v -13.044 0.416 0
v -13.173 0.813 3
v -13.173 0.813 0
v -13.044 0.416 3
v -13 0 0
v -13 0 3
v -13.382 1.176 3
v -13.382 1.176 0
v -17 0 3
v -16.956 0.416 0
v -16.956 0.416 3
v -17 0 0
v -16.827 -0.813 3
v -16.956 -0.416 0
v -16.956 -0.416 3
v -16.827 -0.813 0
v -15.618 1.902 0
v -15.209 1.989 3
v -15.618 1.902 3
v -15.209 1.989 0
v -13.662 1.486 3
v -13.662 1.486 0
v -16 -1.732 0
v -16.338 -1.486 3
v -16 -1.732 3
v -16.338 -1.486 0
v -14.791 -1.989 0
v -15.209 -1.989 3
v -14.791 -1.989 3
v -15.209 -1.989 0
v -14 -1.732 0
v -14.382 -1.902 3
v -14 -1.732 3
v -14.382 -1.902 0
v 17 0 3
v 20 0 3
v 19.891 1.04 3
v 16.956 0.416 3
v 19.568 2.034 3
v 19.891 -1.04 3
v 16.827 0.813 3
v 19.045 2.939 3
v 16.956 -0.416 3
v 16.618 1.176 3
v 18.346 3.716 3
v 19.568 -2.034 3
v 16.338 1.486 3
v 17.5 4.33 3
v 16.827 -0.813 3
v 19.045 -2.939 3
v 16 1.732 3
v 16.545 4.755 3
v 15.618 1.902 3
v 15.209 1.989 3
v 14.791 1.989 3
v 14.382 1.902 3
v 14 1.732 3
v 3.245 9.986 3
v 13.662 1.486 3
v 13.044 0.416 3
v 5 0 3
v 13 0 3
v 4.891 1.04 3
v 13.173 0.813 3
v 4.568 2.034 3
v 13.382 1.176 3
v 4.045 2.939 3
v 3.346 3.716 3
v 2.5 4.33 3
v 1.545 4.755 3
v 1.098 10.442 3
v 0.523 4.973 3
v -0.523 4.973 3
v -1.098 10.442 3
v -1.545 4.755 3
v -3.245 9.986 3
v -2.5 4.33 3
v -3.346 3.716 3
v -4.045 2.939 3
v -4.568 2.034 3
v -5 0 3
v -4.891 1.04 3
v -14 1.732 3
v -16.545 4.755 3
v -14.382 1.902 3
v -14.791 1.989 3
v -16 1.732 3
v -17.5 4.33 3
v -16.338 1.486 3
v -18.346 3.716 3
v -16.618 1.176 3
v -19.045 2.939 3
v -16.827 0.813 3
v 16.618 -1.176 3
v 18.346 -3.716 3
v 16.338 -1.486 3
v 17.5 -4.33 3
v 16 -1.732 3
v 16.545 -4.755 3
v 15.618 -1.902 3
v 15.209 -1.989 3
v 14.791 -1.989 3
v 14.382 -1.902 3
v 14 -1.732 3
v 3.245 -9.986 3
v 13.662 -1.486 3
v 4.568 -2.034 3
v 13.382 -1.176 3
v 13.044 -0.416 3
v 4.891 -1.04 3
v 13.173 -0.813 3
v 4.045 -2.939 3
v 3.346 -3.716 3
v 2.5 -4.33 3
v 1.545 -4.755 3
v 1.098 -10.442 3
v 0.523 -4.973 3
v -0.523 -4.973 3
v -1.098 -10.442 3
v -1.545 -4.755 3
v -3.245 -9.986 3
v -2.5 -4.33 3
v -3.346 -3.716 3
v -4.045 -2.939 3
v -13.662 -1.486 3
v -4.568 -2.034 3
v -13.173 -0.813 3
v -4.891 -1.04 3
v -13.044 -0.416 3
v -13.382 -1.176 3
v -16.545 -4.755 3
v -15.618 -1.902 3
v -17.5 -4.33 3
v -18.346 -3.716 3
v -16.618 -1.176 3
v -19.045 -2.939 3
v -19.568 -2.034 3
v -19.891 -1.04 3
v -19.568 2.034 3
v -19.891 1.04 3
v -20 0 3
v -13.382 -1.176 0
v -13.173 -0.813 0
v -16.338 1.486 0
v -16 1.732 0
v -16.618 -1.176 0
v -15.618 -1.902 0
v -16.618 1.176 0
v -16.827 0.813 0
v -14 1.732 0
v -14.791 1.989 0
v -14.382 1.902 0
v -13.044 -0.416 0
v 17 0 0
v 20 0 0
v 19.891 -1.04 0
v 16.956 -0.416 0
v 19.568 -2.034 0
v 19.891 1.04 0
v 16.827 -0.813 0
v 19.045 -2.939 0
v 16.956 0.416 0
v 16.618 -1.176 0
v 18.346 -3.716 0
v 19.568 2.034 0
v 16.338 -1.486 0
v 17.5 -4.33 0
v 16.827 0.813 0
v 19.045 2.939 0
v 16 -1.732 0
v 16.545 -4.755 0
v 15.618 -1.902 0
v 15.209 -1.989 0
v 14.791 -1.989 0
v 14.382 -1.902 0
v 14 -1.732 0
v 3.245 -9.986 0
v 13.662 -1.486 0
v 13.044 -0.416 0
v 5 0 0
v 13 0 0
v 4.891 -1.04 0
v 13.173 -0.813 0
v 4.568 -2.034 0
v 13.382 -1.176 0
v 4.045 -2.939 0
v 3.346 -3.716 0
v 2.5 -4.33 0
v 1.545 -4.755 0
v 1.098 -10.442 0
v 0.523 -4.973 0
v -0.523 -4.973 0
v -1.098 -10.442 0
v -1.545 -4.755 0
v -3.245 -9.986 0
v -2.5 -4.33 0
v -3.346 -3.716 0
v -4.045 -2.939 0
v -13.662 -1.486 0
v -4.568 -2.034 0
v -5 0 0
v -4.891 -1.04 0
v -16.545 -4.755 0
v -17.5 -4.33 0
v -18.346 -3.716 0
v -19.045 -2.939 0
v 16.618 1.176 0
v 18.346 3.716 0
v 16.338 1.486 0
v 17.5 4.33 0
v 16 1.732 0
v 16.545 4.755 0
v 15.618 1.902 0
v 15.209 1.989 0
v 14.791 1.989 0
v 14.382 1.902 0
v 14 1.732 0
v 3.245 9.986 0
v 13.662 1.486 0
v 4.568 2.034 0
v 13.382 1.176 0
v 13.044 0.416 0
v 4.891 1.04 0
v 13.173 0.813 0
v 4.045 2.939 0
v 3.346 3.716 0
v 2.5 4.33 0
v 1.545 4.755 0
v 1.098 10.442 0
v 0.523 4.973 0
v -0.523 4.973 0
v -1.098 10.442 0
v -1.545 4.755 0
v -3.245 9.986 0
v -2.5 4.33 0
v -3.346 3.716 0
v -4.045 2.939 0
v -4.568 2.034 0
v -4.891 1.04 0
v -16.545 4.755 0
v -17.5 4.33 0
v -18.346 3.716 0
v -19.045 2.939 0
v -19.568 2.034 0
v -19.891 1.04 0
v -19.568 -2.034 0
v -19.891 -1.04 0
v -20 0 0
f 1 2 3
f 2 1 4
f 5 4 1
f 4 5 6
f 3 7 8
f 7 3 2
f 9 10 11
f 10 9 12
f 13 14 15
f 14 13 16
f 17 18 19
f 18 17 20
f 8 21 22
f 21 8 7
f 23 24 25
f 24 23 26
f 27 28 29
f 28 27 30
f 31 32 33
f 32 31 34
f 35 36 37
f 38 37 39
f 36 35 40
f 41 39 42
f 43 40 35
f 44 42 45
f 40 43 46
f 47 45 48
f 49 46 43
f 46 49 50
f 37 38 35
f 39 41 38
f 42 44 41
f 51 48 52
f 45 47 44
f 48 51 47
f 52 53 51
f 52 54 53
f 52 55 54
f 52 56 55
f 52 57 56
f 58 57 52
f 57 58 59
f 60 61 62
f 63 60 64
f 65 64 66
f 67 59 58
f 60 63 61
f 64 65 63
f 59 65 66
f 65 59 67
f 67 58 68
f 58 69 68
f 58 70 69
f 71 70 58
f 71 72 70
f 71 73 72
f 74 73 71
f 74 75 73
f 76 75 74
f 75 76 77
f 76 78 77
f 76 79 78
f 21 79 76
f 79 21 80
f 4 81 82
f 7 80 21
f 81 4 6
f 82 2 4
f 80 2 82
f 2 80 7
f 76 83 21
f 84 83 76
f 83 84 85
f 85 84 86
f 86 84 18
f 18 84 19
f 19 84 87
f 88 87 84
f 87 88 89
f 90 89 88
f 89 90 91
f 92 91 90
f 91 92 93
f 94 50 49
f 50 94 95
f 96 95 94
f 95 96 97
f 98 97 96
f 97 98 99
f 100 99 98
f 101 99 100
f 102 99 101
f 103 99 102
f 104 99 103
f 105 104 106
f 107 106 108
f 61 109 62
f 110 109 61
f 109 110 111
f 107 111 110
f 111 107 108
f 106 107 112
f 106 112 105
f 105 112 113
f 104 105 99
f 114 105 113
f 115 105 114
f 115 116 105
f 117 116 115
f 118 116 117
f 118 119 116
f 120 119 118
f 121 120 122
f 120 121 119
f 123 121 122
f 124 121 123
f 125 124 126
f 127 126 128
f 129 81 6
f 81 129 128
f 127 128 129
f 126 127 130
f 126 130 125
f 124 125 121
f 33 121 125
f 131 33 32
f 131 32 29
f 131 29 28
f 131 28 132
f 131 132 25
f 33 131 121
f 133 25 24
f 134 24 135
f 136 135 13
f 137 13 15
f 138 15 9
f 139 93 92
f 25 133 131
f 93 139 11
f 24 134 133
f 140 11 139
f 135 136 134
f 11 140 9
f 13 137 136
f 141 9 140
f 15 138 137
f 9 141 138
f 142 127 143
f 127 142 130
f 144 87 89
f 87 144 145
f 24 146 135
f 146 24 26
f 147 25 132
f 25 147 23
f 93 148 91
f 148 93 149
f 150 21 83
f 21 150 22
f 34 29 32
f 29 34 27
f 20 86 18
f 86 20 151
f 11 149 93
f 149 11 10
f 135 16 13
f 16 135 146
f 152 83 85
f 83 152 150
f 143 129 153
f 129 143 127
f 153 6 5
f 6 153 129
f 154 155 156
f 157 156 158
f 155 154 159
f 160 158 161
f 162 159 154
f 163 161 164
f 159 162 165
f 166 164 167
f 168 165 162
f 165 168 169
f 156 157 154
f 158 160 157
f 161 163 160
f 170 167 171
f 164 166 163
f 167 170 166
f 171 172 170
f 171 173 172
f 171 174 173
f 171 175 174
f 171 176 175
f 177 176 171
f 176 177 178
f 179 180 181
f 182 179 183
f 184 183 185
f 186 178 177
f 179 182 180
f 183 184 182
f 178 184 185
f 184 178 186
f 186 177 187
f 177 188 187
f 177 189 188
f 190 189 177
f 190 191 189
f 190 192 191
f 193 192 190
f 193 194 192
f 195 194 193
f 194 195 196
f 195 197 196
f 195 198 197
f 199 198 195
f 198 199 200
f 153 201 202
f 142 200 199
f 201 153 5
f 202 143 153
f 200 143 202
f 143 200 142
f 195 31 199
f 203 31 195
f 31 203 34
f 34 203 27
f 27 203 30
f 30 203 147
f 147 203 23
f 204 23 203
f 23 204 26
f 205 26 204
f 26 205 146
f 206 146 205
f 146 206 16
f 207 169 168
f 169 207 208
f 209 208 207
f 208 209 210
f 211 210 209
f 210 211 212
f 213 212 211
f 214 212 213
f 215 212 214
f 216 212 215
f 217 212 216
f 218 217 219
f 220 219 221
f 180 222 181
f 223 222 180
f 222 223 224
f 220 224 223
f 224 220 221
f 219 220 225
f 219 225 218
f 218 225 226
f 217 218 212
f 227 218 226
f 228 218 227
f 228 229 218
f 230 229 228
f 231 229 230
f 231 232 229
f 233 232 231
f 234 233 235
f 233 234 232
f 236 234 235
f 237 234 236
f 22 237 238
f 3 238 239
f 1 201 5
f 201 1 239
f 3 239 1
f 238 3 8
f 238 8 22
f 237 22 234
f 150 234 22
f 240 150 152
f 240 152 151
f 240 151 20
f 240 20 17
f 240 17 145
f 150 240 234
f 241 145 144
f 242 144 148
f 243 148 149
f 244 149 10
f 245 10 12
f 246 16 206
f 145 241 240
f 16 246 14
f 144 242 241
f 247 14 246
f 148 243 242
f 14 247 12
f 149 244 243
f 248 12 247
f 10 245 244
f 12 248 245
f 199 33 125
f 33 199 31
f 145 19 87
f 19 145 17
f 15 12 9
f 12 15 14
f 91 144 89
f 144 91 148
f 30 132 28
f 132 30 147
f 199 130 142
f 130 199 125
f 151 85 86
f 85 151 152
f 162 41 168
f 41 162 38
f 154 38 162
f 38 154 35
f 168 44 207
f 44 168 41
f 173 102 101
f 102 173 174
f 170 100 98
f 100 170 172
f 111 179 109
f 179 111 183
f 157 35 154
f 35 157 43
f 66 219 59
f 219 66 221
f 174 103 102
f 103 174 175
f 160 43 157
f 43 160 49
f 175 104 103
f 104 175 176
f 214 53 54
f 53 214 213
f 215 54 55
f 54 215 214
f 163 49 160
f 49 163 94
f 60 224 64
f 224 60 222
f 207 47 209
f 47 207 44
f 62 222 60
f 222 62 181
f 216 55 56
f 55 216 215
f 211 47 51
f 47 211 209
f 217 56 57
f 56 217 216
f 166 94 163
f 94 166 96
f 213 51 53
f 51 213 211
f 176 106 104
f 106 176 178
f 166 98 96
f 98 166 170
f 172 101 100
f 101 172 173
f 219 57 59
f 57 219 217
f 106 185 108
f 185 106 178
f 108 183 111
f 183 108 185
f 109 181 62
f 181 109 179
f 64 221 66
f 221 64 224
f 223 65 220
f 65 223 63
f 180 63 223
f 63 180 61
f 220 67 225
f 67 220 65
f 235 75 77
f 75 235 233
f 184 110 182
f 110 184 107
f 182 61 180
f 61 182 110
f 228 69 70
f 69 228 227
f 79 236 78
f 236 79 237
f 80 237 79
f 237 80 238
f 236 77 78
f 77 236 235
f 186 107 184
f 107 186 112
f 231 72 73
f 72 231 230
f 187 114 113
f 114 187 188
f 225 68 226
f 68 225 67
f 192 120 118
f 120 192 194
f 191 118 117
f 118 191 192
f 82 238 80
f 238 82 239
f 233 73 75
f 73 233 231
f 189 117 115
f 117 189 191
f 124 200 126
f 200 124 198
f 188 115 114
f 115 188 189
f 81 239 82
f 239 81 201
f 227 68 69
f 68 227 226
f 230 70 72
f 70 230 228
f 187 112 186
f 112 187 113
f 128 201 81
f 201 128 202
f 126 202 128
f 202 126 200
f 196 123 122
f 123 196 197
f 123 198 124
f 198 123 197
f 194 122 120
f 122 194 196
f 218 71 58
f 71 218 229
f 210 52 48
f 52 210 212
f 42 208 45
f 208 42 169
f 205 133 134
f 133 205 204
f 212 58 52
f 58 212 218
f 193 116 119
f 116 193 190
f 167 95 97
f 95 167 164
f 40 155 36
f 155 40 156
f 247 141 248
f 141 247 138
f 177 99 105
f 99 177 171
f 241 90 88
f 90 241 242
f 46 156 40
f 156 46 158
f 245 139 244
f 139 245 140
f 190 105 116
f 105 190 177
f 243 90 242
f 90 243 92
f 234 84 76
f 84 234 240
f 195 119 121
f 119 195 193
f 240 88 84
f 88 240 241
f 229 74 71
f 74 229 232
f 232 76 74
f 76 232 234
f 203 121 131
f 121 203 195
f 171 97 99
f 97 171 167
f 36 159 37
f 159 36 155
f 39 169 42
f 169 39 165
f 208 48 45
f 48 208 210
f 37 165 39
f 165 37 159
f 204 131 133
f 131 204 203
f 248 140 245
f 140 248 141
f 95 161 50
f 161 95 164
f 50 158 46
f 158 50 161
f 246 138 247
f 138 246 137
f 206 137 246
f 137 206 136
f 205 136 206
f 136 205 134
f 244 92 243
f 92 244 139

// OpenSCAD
screws = [[-15,0], [15,0]];
pipe_max_radius = 5;
plug_max_radius = 7.5;
plug_taper = 2;
plug_depth = 5;

tube_inner_radius = 1.75;
tube_outer_radius = 2.5;

screw_radius = 2;
plug_thickness = 3;

$fn = 30;

module inner(screws = screws, plug_max_radius = plug_max_radius, screw_radius = screw_radius) {
    difference() {
        hull() {
            cylinder(r = plug_max_radius + plug_thickness, h = plug_thickness);
            for (screw = screws) {
                translate([screw[0], screw[1], 0]) cylinder(r = screw_radius + plug_thickness, h = plug_thickness);
            }
        }
        union() {
            cylinder(r = plug_max_radius, h = plug_thickness);
            for (screw = screws) {
                translate([screw[0], screw[1], 0]) cylinder(r = screw_radius, h = plug_thickness);
            }
        }
    }
}

module outer(screws = screws, pipe_max_radius = pipe_max_radius, plug_max_radius = plug_max_radius, screw_radius = screw_radius) {
    difference() {
        hull() {
            cylinder(r = plug_max_radius + plug_thickness, h = plug_thickness);
            for (screw = screws) {
                translate([screw[0], screw[1], 0]) cylinder(r = screw_radius + plug_thickness, h = plug_thickness);
            }
        }
        union() {
            cylinder(r = pipe_max_radius, h = plug_thickness);
            for (screw = screws) {
                translate([screw[0], screw[1], 0]) cylinder(r = screw_radius, h = plug_thickness);
            }
        }
    }
}

module seal_mould(screws = screws, plug_max_radius = plug_max_radius, screw_radius = screw_radius) {
    difference() {
        minkowski() {
            hull() inner(screws = screws, plug_max_radius = plug_max_radius, screw_radius = screw_radius);
            cylinder (r = 3, h = 0.1);
        }
        translate([0, 0, 1]) inner(screws = screws, plug_max_radius = plug_max_radius, screw_radius = screw_radius);
    }
    
}

module plug(tube_inner_radius = tube_inner_radius, plug_depth = plug_depth, plug_taper = plug_taper, plug_max_radius = plug_max_radius) {
    difference() {
        union() {
            cylinder(r = plug_max_radius - plug_taper, h = 1, $fn=$fn);
            cylinder(r = tube_outer_radius, h = 20, $fn=$fn);
            translate([0, 0, 15]) cylinder(r1 = tube_outer_radius, r2 = tube_outer_radius + 1, h = 2.5, $fn=$fn);
            translate([0, 0, 17.5]) cylinder(r2 = tube_outer_radius, r1 = tube_outer_radius + 1, h = 2.5, $fn=$fn);
            cylinder(r = plug_max_radius - plug_taper - 1, h = plug_depth, $fn=$fn);
            translate([0, 0, plug_depth - plug_taper]) cylinder(r1 = plug_max_radius - plug_taper - 1, r2 = plug_max_radius, h = plug_taper + 1, $fn=$fn);
        }
        union() {
            cylinder(r = tube_inner_radius, h = 20, $fn=$fn);
        }
    }
}

module plug_mould(screws = screws, plug_depth = plug_depth, plug_taper = plug_taper, plug_max_radius = plug_max_radius) {
    difference() {
        cylinder(r1 = plug_max_radius - plug_taper + 1.5, r2 = plug_max_radius + 1.5, h = plug_depth);
        cylinder(r1 = plug_max_radius - plug_taper + 0.5, r2 = plug_max_radius + 0.5, h = plug_depth);
    }
}

module mould_base(screws = screws, plug_depth = plug_depth, plug_taper = plug_taper, plug_max_radius = plug_max_radius, $fn = $fn) {
    difference() {
        cylinder(r = plug_max_radius - plug_taper + 2.5, h = 2, $fn = $fn);
        translate([0, 0, 1]) difference() {
            cylinder(r = plug_max_radius - plug_taper + 2, h = 2, $fn = $fn);
            cylinder(r = tube_inner_radius - 0.5, h = 2, $fn = $fn);
        }
    }
}

// seal_mould(screw_radius = 2);
outer();
